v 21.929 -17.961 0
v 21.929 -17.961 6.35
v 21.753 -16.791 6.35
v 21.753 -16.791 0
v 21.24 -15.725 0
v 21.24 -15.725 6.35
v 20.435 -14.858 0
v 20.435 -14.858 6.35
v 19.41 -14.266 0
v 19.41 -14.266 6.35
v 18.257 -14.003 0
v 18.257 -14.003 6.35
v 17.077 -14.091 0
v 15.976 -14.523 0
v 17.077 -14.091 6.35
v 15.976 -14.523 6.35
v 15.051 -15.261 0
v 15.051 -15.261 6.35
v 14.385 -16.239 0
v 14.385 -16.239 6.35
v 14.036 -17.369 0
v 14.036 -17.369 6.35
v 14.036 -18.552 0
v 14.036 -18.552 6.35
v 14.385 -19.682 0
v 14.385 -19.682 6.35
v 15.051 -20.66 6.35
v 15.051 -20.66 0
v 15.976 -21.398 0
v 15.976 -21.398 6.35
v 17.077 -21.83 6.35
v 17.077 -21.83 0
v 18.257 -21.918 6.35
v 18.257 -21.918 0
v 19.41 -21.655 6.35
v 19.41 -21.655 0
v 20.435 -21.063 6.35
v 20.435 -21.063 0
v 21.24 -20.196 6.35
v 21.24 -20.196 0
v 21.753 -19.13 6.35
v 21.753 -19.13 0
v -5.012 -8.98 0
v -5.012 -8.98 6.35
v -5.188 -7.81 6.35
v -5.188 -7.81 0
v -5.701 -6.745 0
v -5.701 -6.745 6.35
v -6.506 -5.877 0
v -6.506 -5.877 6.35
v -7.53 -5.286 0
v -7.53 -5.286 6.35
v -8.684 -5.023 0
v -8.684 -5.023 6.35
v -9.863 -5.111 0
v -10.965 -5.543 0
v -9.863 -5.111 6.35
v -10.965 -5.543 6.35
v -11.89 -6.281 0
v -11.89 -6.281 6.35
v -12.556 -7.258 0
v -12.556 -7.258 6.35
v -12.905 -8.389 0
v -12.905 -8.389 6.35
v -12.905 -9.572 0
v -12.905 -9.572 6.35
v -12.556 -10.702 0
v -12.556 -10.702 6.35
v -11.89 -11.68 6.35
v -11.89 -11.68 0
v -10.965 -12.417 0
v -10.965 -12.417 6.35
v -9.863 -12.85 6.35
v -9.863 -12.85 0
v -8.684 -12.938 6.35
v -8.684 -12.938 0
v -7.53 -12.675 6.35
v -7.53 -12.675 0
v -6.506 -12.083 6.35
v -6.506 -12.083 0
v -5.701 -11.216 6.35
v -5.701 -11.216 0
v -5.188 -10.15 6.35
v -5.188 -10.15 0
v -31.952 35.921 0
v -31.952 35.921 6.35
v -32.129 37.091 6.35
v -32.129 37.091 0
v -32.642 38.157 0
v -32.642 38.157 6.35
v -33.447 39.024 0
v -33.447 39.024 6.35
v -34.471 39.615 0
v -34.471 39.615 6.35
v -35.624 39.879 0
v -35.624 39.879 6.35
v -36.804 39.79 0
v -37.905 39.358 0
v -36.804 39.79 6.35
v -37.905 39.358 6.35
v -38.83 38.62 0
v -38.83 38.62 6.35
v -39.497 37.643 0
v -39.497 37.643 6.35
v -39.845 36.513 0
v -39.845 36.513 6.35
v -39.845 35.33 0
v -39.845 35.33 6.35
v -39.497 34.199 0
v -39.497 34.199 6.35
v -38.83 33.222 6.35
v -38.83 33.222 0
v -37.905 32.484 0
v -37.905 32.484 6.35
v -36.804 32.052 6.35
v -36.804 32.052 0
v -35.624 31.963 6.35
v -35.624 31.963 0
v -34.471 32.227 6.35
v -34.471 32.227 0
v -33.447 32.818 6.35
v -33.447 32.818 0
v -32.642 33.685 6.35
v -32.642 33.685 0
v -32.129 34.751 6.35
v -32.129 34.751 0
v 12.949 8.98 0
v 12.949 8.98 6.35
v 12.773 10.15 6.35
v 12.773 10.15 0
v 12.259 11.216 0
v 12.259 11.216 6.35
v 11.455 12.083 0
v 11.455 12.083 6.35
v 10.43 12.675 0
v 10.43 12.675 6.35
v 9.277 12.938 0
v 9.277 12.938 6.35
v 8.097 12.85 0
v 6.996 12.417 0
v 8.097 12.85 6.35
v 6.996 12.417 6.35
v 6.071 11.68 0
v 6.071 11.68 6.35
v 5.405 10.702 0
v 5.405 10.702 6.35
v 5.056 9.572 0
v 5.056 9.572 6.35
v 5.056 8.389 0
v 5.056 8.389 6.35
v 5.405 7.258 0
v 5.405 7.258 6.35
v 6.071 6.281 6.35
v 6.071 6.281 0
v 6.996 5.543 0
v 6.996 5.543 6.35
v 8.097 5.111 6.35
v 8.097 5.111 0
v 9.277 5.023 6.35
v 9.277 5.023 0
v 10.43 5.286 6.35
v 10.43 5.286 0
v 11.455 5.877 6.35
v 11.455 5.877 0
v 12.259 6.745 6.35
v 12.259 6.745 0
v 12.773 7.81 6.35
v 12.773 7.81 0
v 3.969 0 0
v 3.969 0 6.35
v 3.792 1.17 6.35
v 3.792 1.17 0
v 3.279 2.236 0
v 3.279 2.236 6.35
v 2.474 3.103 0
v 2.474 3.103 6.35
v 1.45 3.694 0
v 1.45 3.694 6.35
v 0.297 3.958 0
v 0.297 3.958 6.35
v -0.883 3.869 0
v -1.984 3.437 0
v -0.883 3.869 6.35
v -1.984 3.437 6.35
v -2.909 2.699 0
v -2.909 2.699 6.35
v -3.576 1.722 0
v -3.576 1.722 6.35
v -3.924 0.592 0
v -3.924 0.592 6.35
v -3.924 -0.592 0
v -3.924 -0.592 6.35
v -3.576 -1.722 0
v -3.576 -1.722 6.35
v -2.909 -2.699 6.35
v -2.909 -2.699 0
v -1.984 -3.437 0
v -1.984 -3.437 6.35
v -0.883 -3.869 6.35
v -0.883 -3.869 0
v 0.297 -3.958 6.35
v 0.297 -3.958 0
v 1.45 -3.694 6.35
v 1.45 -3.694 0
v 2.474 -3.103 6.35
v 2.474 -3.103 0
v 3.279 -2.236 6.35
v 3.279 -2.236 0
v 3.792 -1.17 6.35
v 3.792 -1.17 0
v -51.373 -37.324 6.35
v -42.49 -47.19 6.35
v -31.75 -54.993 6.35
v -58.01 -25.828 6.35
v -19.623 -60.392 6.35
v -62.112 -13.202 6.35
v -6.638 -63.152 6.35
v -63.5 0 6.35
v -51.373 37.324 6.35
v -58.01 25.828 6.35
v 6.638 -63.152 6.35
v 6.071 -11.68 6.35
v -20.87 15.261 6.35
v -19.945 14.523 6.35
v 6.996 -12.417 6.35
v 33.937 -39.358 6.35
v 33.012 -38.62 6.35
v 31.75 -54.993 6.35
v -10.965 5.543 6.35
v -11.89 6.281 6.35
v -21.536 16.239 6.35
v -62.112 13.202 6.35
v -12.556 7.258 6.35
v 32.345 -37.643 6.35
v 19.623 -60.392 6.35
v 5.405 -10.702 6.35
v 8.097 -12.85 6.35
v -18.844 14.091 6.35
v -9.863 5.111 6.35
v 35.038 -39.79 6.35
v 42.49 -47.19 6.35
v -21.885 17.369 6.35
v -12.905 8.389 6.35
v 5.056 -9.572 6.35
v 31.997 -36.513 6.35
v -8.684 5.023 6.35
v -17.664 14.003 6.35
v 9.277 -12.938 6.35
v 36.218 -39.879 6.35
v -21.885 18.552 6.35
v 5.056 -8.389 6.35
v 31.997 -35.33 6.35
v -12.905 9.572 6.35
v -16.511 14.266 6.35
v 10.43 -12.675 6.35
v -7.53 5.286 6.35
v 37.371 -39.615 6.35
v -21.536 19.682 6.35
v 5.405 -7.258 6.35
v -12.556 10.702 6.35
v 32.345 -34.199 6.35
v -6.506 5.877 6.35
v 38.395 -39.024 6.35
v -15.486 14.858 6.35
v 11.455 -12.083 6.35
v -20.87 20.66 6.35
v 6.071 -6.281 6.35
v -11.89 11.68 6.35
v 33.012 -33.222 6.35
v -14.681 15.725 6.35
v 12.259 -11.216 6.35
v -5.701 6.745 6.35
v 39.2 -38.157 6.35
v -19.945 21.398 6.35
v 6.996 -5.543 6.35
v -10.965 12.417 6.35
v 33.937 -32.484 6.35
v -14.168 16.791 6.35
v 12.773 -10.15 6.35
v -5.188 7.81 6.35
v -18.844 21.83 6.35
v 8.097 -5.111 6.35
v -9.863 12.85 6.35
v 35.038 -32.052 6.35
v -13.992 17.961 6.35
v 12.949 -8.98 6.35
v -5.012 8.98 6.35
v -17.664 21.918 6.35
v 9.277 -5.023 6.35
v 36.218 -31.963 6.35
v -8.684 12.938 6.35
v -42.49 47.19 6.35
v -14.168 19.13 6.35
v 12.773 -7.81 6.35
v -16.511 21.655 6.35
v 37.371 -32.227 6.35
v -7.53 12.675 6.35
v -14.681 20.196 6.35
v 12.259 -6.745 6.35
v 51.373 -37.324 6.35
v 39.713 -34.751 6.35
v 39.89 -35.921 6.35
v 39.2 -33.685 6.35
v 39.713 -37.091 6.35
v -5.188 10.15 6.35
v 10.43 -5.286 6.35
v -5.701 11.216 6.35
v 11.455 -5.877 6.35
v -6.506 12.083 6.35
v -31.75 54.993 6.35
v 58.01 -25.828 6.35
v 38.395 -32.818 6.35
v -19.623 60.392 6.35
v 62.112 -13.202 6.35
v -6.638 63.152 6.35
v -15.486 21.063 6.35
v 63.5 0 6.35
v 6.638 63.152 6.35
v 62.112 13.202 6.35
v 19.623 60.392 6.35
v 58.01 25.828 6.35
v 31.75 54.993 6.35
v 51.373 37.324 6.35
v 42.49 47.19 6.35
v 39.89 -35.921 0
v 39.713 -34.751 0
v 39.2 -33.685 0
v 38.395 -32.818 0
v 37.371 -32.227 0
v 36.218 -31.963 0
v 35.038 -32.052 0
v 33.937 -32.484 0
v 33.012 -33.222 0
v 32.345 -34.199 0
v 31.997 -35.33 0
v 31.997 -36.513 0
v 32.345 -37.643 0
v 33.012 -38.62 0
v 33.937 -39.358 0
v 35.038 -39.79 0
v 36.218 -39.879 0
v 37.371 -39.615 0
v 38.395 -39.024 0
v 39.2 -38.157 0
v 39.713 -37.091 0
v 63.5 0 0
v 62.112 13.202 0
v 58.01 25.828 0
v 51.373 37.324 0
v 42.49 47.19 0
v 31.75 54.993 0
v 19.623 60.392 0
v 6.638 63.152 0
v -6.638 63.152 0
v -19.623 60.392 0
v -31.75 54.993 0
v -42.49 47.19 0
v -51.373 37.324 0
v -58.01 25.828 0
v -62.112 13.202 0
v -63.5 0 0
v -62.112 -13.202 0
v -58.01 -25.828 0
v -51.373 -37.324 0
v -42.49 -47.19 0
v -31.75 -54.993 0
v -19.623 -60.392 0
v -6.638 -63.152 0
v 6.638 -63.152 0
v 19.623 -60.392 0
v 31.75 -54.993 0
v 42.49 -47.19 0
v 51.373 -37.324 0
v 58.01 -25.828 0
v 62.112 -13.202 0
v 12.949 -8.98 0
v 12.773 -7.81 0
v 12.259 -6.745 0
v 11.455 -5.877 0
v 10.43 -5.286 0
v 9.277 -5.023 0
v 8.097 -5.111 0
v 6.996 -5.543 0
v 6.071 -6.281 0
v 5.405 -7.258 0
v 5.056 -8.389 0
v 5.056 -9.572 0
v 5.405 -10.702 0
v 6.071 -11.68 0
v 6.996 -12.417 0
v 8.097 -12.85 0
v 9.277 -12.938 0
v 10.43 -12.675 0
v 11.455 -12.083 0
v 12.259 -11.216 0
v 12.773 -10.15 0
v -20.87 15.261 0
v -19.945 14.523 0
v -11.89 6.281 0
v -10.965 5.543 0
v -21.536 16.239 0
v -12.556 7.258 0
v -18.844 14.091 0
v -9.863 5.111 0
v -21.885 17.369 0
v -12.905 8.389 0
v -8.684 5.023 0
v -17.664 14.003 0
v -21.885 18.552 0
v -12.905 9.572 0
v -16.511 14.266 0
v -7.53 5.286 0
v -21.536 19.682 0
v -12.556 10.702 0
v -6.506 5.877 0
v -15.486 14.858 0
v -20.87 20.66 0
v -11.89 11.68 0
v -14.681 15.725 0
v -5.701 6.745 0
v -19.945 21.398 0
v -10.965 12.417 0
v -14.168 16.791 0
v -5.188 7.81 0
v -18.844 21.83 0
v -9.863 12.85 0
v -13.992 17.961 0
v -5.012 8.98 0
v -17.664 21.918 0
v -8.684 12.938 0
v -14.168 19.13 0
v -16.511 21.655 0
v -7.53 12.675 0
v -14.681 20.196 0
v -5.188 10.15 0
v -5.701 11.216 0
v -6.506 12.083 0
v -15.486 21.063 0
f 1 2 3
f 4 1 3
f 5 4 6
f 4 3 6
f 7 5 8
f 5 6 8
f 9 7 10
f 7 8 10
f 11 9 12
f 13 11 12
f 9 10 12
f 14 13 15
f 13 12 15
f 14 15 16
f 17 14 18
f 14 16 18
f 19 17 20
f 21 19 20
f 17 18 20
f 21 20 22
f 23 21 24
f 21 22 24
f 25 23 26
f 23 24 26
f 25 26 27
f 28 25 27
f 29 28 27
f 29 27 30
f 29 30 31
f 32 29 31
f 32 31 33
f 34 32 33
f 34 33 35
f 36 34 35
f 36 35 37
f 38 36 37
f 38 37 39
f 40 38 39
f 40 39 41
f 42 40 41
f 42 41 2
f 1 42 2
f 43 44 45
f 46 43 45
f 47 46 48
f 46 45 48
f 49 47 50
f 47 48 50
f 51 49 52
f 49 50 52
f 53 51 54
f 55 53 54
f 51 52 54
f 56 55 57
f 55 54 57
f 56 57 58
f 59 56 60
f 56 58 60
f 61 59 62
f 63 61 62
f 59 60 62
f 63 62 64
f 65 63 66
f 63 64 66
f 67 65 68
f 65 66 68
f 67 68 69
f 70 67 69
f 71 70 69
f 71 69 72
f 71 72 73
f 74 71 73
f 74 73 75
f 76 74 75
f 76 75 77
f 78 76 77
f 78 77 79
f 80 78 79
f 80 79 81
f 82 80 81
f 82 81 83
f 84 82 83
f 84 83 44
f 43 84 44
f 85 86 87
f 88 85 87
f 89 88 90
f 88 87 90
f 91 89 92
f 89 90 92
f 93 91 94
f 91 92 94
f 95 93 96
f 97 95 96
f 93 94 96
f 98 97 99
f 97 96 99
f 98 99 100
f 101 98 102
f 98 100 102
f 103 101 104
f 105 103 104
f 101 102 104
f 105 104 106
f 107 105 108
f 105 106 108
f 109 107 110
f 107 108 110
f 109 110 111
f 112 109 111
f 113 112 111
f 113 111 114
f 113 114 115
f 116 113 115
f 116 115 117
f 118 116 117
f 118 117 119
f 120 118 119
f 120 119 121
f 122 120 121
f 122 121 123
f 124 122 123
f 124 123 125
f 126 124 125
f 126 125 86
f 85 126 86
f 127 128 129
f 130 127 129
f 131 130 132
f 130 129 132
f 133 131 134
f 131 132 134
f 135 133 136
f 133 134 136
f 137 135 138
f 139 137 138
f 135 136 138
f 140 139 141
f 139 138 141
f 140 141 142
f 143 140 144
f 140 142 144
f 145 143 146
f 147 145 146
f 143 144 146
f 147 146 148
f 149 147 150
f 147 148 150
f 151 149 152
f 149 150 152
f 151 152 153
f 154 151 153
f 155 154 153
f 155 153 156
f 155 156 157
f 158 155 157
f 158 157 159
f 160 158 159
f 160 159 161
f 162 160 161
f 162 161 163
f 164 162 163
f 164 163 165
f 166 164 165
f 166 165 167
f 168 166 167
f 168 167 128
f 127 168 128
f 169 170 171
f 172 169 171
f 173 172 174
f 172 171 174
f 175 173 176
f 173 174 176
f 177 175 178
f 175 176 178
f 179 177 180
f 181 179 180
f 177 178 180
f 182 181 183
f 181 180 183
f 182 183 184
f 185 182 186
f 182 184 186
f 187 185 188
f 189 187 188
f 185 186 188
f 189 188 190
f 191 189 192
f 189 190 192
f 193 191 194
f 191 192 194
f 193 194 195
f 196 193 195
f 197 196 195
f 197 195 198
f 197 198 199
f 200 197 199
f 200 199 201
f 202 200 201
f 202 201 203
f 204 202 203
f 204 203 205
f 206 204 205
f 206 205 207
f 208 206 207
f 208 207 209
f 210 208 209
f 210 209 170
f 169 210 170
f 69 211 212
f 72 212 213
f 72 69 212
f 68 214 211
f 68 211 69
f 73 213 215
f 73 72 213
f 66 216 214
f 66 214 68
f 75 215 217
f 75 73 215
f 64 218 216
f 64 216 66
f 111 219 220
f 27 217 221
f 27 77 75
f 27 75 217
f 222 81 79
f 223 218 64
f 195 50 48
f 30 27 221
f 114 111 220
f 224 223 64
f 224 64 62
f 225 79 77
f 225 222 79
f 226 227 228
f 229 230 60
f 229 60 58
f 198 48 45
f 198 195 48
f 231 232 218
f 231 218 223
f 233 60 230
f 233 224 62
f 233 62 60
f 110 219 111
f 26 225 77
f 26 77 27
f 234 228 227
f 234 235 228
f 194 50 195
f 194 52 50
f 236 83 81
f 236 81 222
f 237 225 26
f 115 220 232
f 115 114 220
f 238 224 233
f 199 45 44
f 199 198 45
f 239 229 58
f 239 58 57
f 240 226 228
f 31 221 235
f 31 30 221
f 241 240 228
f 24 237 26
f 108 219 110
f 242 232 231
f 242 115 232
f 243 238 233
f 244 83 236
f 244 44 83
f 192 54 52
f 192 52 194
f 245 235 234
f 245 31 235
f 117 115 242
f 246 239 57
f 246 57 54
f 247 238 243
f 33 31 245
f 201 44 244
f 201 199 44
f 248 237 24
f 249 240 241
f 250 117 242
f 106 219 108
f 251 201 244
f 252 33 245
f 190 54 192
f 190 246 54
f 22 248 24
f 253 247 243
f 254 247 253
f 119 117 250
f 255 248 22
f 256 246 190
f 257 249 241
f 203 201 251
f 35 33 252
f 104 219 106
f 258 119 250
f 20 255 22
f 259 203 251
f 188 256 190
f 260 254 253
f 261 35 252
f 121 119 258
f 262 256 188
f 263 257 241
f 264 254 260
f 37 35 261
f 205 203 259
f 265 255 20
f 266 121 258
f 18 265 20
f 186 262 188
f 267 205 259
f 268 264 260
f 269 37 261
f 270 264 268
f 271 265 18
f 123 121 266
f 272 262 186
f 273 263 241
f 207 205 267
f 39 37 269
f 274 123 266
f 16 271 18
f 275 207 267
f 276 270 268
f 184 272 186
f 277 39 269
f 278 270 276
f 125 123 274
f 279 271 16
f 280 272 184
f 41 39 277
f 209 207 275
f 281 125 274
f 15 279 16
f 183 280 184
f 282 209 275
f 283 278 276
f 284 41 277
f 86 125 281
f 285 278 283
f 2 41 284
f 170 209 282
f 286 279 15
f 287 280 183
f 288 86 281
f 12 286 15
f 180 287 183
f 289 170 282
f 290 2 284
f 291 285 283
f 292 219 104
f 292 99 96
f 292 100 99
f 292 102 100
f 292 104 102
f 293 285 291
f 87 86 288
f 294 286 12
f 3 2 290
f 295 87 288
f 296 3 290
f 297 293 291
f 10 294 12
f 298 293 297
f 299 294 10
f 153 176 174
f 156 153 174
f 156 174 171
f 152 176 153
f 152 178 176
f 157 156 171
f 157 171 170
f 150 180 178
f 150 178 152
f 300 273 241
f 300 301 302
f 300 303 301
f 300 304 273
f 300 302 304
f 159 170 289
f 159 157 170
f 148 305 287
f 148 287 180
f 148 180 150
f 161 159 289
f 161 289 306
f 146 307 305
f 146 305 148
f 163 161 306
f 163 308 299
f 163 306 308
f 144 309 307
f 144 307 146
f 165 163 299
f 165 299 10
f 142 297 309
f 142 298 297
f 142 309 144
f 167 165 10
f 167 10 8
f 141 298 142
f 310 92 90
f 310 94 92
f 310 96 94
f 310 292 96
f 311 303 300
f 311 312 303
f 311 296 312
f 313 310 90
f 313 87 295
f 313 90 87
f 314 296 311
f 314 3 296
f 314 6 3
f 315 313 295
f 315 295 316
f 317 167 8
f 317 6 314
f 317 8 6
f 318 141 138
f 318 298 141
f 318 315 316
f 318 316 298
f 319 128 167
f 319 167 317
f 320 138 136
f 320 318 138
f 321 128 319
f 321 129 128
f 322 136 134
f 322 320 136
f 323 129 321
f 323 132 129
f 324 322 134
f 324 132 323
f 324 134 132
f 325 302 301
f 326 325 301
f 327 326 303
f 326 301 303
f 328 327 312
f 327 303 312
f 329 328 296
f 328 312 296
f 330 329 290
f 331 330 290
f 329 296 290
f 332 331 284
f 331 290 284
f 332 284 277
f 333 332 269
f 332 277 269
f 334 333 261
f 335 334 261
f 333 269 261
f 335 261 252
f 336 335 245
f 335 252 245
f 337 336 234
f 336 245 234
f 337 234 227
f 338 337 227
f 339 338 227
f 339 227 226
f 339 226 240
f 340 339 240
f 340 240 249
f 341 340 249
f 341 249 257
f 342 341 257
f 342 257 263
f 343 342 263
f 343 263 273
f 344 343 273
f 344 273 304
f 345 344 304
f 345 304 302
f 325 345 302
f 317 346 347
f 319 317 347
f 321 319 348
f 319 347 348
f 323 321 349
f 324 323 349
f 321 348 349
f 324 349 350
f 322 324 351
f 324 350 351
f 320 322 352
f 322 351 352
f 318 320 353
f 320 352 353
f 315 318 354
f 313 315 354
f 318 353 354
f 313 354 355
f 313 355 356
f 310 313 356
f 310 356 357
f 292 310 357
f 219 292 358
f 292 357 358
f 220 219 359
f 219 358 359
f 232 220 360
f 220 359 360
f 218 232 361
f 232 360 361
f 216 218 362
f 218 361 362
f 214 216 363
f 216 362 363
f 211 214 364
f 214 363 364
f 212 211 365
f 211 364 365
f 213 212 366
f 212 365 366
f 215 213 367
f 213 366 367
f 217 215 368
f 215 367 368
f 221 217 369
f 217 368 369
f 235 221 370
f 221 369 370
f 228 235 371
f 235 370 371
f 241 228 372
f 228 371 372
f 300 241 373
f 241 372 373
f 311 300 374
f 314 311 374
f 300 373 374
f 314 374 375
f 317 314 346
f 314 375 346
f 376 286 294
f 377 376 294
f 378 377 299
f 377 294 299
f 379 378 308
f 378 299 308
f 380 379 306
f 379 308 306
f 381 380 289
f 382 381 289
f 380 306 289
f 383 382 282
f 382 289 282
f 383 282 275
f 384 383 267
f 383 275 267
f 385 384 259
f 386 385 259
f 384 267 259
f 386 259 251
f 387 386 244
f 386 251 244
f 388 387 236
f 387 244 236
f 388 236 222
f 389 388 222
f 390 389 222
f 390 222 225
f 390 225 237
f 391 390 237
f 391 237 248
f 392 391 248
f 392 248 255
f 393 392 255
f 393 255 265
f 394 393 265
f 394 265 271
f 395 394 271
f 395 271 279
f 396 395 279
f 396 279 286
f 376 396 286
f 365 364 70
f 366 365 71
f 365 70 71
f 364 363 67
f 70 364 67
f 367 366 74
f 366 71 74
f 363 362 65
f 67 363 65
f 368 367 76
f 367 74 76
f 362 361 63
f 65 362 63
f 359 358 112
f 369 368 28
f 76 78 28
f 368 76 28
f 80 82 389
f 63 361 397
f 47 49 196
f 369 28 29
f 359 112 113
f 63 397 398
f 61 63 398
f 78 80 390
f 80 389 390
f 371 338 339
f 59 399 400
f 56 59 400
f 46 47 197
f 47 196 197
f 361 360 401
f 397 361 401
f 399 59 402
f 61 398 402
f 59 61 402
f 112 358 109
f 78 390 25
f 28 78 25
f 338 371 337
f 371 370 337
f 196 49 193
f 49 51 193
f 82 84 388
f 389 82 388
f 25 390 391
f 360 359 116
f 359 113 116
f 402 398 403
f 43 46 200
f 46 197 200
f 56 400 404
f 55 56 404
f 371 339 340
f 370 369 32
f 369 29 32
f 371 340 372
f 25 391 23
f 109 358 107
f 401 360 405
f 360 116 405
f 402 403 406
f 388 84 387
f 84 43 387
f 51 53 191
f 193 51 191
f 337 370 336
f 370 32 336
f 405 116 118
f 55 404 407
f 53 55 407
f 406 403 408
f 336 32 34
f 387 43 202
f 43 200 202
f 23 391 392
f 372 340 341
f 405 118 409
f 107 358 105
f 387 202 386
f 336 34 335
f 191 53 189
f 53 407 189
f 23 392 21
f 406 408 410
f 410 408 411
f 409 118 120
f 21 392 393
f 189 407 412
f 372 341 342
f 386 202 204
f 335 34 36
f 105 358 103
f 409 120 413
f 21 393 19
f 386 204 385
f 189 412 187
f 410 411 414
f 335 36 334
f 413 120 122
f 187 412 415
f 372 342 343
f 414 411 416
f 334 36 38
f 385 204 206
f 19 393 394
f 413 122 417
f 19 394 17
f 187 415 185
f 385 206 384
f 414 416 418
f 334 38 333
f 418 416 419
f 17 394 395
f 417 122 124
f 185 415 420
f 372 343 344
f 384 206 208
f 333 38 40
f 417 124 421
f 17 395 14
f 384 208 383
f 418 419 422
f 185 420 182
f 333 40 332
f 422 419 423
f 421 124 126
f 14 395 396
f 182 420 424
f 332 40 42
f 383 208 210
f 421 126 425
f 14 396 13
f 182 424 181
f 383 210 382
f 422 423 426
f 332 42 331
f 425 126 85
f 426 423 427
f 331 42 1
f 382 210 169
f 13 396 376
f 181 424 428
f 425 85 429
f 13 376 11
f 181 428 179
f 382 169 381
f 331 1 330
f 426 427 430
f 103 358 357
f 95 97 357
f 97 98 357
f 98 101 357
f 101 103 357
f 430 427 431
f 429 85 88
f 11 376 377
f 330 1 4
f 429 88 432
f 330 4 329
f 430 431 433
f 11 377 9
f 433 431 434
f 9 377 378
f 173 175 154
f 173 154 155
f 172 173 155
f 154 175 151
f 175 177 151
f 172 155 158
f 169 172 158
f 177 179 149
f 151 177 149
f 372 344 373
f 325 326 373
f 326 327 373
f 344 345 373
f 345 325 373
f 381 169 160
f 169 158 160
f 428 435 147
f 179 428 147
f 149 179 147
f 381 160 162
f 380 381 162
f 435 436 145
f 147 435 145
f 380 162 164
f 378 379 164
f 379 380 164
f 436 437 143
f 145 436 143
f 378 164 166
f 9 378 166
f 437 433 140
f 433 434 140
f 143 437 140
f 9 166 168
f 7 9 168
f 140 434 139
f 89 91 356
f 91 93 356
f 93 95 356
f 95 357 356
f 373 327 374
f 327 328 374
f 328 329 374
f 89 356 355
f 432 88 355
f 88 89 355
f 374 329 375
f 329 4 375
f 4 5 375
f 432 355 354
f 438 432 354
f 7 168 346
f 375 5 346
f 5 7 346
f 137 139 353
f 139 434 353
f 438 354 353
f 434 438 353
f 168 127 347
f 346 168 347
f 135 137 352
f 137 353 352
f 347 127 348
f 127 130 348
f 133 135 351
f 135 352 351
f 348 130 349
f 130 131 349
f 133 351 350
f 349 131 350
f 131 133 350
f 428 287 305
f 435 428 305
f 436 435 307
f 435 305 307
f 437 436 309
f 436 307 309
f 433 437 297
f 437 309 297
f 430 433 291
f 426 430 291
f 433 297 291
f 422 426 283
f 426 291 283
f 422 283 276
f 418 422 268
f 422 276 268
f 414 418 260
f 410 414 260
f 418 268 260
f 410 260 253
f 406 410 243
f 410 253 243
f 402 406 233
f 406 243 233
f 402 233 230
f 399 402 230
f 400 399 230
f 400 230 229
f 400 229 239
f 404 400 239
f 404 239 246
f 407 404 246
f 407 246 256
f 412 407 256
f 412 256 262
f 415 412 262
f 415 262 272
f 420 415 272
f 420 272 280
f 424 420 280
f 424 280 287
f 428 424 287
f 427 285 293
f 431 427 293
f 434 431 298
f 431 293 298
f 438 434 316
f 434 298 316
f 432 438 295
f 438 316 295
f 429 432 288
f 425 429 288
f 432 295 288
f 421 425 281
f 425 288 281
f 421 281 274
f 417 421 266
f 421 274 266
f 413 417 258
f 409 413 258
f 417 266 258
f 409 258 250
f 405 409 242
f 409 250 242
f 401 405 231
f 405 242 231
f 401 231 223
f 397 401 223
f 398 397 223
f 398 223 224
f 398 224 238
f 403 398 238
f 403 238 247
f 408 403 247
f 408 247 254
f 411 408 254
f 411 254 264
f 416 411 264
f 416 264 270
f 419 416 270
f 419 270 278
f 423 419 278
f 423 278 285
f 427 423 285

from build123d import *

# Parameters (mm, degrees)
SKETCH1_R           = 63.5
BOSS_EXTRUDE1_DEPTH = 6.35
SKETCH2_R           = 3.96875
CUT_EXTRUDE1_DEPTH  = 7.35


with BuildPart() as part:
    # Sketch1 → Boss-Extrude1 (new body)
    with BuildSketch(Plane.XY):
        Circle(SKETCH1_R)
    extrude(amount=BOSS_EXTRUDE1_DEPTH)

    # Sketch2 → Cut-Extrude1 (cut, through all)
    with BuildSketch(Plane.XY.offset(6.35)):
        Circle(SKETCH2_R)
        with Locations((-8.980256121, 8.980256121)):
            Circle(SKETCH2_R)
        with Locations((8.980256121, -8.980256121)):
            Circle(SKETCH2_R)
        with Locations((8.980256121, 8.980256121)):
            Circle(SKETCH2_R)
        with Locations((-8.980256121, -8.980256121)):
            Circle(SKETCH2_R)
        with Locations((17.960512242, -17.960512242)):
            Circle(SKETCH2_R)
        with Locations((35.921024484, -35.921024484)):
            Circle(SKETCH2_R)
        with Locations((-17.960512242, 17.960512242)):
            Circle(SKETCH2_R)
        with Locations((-35.921024484, 35.921024484)):
            Circle(SKETCH2_R)
    extrude(amount=-CUT_EXTRUDE1_DEPTH, mode=Mode.SUBTRACT)


solid = part.part
